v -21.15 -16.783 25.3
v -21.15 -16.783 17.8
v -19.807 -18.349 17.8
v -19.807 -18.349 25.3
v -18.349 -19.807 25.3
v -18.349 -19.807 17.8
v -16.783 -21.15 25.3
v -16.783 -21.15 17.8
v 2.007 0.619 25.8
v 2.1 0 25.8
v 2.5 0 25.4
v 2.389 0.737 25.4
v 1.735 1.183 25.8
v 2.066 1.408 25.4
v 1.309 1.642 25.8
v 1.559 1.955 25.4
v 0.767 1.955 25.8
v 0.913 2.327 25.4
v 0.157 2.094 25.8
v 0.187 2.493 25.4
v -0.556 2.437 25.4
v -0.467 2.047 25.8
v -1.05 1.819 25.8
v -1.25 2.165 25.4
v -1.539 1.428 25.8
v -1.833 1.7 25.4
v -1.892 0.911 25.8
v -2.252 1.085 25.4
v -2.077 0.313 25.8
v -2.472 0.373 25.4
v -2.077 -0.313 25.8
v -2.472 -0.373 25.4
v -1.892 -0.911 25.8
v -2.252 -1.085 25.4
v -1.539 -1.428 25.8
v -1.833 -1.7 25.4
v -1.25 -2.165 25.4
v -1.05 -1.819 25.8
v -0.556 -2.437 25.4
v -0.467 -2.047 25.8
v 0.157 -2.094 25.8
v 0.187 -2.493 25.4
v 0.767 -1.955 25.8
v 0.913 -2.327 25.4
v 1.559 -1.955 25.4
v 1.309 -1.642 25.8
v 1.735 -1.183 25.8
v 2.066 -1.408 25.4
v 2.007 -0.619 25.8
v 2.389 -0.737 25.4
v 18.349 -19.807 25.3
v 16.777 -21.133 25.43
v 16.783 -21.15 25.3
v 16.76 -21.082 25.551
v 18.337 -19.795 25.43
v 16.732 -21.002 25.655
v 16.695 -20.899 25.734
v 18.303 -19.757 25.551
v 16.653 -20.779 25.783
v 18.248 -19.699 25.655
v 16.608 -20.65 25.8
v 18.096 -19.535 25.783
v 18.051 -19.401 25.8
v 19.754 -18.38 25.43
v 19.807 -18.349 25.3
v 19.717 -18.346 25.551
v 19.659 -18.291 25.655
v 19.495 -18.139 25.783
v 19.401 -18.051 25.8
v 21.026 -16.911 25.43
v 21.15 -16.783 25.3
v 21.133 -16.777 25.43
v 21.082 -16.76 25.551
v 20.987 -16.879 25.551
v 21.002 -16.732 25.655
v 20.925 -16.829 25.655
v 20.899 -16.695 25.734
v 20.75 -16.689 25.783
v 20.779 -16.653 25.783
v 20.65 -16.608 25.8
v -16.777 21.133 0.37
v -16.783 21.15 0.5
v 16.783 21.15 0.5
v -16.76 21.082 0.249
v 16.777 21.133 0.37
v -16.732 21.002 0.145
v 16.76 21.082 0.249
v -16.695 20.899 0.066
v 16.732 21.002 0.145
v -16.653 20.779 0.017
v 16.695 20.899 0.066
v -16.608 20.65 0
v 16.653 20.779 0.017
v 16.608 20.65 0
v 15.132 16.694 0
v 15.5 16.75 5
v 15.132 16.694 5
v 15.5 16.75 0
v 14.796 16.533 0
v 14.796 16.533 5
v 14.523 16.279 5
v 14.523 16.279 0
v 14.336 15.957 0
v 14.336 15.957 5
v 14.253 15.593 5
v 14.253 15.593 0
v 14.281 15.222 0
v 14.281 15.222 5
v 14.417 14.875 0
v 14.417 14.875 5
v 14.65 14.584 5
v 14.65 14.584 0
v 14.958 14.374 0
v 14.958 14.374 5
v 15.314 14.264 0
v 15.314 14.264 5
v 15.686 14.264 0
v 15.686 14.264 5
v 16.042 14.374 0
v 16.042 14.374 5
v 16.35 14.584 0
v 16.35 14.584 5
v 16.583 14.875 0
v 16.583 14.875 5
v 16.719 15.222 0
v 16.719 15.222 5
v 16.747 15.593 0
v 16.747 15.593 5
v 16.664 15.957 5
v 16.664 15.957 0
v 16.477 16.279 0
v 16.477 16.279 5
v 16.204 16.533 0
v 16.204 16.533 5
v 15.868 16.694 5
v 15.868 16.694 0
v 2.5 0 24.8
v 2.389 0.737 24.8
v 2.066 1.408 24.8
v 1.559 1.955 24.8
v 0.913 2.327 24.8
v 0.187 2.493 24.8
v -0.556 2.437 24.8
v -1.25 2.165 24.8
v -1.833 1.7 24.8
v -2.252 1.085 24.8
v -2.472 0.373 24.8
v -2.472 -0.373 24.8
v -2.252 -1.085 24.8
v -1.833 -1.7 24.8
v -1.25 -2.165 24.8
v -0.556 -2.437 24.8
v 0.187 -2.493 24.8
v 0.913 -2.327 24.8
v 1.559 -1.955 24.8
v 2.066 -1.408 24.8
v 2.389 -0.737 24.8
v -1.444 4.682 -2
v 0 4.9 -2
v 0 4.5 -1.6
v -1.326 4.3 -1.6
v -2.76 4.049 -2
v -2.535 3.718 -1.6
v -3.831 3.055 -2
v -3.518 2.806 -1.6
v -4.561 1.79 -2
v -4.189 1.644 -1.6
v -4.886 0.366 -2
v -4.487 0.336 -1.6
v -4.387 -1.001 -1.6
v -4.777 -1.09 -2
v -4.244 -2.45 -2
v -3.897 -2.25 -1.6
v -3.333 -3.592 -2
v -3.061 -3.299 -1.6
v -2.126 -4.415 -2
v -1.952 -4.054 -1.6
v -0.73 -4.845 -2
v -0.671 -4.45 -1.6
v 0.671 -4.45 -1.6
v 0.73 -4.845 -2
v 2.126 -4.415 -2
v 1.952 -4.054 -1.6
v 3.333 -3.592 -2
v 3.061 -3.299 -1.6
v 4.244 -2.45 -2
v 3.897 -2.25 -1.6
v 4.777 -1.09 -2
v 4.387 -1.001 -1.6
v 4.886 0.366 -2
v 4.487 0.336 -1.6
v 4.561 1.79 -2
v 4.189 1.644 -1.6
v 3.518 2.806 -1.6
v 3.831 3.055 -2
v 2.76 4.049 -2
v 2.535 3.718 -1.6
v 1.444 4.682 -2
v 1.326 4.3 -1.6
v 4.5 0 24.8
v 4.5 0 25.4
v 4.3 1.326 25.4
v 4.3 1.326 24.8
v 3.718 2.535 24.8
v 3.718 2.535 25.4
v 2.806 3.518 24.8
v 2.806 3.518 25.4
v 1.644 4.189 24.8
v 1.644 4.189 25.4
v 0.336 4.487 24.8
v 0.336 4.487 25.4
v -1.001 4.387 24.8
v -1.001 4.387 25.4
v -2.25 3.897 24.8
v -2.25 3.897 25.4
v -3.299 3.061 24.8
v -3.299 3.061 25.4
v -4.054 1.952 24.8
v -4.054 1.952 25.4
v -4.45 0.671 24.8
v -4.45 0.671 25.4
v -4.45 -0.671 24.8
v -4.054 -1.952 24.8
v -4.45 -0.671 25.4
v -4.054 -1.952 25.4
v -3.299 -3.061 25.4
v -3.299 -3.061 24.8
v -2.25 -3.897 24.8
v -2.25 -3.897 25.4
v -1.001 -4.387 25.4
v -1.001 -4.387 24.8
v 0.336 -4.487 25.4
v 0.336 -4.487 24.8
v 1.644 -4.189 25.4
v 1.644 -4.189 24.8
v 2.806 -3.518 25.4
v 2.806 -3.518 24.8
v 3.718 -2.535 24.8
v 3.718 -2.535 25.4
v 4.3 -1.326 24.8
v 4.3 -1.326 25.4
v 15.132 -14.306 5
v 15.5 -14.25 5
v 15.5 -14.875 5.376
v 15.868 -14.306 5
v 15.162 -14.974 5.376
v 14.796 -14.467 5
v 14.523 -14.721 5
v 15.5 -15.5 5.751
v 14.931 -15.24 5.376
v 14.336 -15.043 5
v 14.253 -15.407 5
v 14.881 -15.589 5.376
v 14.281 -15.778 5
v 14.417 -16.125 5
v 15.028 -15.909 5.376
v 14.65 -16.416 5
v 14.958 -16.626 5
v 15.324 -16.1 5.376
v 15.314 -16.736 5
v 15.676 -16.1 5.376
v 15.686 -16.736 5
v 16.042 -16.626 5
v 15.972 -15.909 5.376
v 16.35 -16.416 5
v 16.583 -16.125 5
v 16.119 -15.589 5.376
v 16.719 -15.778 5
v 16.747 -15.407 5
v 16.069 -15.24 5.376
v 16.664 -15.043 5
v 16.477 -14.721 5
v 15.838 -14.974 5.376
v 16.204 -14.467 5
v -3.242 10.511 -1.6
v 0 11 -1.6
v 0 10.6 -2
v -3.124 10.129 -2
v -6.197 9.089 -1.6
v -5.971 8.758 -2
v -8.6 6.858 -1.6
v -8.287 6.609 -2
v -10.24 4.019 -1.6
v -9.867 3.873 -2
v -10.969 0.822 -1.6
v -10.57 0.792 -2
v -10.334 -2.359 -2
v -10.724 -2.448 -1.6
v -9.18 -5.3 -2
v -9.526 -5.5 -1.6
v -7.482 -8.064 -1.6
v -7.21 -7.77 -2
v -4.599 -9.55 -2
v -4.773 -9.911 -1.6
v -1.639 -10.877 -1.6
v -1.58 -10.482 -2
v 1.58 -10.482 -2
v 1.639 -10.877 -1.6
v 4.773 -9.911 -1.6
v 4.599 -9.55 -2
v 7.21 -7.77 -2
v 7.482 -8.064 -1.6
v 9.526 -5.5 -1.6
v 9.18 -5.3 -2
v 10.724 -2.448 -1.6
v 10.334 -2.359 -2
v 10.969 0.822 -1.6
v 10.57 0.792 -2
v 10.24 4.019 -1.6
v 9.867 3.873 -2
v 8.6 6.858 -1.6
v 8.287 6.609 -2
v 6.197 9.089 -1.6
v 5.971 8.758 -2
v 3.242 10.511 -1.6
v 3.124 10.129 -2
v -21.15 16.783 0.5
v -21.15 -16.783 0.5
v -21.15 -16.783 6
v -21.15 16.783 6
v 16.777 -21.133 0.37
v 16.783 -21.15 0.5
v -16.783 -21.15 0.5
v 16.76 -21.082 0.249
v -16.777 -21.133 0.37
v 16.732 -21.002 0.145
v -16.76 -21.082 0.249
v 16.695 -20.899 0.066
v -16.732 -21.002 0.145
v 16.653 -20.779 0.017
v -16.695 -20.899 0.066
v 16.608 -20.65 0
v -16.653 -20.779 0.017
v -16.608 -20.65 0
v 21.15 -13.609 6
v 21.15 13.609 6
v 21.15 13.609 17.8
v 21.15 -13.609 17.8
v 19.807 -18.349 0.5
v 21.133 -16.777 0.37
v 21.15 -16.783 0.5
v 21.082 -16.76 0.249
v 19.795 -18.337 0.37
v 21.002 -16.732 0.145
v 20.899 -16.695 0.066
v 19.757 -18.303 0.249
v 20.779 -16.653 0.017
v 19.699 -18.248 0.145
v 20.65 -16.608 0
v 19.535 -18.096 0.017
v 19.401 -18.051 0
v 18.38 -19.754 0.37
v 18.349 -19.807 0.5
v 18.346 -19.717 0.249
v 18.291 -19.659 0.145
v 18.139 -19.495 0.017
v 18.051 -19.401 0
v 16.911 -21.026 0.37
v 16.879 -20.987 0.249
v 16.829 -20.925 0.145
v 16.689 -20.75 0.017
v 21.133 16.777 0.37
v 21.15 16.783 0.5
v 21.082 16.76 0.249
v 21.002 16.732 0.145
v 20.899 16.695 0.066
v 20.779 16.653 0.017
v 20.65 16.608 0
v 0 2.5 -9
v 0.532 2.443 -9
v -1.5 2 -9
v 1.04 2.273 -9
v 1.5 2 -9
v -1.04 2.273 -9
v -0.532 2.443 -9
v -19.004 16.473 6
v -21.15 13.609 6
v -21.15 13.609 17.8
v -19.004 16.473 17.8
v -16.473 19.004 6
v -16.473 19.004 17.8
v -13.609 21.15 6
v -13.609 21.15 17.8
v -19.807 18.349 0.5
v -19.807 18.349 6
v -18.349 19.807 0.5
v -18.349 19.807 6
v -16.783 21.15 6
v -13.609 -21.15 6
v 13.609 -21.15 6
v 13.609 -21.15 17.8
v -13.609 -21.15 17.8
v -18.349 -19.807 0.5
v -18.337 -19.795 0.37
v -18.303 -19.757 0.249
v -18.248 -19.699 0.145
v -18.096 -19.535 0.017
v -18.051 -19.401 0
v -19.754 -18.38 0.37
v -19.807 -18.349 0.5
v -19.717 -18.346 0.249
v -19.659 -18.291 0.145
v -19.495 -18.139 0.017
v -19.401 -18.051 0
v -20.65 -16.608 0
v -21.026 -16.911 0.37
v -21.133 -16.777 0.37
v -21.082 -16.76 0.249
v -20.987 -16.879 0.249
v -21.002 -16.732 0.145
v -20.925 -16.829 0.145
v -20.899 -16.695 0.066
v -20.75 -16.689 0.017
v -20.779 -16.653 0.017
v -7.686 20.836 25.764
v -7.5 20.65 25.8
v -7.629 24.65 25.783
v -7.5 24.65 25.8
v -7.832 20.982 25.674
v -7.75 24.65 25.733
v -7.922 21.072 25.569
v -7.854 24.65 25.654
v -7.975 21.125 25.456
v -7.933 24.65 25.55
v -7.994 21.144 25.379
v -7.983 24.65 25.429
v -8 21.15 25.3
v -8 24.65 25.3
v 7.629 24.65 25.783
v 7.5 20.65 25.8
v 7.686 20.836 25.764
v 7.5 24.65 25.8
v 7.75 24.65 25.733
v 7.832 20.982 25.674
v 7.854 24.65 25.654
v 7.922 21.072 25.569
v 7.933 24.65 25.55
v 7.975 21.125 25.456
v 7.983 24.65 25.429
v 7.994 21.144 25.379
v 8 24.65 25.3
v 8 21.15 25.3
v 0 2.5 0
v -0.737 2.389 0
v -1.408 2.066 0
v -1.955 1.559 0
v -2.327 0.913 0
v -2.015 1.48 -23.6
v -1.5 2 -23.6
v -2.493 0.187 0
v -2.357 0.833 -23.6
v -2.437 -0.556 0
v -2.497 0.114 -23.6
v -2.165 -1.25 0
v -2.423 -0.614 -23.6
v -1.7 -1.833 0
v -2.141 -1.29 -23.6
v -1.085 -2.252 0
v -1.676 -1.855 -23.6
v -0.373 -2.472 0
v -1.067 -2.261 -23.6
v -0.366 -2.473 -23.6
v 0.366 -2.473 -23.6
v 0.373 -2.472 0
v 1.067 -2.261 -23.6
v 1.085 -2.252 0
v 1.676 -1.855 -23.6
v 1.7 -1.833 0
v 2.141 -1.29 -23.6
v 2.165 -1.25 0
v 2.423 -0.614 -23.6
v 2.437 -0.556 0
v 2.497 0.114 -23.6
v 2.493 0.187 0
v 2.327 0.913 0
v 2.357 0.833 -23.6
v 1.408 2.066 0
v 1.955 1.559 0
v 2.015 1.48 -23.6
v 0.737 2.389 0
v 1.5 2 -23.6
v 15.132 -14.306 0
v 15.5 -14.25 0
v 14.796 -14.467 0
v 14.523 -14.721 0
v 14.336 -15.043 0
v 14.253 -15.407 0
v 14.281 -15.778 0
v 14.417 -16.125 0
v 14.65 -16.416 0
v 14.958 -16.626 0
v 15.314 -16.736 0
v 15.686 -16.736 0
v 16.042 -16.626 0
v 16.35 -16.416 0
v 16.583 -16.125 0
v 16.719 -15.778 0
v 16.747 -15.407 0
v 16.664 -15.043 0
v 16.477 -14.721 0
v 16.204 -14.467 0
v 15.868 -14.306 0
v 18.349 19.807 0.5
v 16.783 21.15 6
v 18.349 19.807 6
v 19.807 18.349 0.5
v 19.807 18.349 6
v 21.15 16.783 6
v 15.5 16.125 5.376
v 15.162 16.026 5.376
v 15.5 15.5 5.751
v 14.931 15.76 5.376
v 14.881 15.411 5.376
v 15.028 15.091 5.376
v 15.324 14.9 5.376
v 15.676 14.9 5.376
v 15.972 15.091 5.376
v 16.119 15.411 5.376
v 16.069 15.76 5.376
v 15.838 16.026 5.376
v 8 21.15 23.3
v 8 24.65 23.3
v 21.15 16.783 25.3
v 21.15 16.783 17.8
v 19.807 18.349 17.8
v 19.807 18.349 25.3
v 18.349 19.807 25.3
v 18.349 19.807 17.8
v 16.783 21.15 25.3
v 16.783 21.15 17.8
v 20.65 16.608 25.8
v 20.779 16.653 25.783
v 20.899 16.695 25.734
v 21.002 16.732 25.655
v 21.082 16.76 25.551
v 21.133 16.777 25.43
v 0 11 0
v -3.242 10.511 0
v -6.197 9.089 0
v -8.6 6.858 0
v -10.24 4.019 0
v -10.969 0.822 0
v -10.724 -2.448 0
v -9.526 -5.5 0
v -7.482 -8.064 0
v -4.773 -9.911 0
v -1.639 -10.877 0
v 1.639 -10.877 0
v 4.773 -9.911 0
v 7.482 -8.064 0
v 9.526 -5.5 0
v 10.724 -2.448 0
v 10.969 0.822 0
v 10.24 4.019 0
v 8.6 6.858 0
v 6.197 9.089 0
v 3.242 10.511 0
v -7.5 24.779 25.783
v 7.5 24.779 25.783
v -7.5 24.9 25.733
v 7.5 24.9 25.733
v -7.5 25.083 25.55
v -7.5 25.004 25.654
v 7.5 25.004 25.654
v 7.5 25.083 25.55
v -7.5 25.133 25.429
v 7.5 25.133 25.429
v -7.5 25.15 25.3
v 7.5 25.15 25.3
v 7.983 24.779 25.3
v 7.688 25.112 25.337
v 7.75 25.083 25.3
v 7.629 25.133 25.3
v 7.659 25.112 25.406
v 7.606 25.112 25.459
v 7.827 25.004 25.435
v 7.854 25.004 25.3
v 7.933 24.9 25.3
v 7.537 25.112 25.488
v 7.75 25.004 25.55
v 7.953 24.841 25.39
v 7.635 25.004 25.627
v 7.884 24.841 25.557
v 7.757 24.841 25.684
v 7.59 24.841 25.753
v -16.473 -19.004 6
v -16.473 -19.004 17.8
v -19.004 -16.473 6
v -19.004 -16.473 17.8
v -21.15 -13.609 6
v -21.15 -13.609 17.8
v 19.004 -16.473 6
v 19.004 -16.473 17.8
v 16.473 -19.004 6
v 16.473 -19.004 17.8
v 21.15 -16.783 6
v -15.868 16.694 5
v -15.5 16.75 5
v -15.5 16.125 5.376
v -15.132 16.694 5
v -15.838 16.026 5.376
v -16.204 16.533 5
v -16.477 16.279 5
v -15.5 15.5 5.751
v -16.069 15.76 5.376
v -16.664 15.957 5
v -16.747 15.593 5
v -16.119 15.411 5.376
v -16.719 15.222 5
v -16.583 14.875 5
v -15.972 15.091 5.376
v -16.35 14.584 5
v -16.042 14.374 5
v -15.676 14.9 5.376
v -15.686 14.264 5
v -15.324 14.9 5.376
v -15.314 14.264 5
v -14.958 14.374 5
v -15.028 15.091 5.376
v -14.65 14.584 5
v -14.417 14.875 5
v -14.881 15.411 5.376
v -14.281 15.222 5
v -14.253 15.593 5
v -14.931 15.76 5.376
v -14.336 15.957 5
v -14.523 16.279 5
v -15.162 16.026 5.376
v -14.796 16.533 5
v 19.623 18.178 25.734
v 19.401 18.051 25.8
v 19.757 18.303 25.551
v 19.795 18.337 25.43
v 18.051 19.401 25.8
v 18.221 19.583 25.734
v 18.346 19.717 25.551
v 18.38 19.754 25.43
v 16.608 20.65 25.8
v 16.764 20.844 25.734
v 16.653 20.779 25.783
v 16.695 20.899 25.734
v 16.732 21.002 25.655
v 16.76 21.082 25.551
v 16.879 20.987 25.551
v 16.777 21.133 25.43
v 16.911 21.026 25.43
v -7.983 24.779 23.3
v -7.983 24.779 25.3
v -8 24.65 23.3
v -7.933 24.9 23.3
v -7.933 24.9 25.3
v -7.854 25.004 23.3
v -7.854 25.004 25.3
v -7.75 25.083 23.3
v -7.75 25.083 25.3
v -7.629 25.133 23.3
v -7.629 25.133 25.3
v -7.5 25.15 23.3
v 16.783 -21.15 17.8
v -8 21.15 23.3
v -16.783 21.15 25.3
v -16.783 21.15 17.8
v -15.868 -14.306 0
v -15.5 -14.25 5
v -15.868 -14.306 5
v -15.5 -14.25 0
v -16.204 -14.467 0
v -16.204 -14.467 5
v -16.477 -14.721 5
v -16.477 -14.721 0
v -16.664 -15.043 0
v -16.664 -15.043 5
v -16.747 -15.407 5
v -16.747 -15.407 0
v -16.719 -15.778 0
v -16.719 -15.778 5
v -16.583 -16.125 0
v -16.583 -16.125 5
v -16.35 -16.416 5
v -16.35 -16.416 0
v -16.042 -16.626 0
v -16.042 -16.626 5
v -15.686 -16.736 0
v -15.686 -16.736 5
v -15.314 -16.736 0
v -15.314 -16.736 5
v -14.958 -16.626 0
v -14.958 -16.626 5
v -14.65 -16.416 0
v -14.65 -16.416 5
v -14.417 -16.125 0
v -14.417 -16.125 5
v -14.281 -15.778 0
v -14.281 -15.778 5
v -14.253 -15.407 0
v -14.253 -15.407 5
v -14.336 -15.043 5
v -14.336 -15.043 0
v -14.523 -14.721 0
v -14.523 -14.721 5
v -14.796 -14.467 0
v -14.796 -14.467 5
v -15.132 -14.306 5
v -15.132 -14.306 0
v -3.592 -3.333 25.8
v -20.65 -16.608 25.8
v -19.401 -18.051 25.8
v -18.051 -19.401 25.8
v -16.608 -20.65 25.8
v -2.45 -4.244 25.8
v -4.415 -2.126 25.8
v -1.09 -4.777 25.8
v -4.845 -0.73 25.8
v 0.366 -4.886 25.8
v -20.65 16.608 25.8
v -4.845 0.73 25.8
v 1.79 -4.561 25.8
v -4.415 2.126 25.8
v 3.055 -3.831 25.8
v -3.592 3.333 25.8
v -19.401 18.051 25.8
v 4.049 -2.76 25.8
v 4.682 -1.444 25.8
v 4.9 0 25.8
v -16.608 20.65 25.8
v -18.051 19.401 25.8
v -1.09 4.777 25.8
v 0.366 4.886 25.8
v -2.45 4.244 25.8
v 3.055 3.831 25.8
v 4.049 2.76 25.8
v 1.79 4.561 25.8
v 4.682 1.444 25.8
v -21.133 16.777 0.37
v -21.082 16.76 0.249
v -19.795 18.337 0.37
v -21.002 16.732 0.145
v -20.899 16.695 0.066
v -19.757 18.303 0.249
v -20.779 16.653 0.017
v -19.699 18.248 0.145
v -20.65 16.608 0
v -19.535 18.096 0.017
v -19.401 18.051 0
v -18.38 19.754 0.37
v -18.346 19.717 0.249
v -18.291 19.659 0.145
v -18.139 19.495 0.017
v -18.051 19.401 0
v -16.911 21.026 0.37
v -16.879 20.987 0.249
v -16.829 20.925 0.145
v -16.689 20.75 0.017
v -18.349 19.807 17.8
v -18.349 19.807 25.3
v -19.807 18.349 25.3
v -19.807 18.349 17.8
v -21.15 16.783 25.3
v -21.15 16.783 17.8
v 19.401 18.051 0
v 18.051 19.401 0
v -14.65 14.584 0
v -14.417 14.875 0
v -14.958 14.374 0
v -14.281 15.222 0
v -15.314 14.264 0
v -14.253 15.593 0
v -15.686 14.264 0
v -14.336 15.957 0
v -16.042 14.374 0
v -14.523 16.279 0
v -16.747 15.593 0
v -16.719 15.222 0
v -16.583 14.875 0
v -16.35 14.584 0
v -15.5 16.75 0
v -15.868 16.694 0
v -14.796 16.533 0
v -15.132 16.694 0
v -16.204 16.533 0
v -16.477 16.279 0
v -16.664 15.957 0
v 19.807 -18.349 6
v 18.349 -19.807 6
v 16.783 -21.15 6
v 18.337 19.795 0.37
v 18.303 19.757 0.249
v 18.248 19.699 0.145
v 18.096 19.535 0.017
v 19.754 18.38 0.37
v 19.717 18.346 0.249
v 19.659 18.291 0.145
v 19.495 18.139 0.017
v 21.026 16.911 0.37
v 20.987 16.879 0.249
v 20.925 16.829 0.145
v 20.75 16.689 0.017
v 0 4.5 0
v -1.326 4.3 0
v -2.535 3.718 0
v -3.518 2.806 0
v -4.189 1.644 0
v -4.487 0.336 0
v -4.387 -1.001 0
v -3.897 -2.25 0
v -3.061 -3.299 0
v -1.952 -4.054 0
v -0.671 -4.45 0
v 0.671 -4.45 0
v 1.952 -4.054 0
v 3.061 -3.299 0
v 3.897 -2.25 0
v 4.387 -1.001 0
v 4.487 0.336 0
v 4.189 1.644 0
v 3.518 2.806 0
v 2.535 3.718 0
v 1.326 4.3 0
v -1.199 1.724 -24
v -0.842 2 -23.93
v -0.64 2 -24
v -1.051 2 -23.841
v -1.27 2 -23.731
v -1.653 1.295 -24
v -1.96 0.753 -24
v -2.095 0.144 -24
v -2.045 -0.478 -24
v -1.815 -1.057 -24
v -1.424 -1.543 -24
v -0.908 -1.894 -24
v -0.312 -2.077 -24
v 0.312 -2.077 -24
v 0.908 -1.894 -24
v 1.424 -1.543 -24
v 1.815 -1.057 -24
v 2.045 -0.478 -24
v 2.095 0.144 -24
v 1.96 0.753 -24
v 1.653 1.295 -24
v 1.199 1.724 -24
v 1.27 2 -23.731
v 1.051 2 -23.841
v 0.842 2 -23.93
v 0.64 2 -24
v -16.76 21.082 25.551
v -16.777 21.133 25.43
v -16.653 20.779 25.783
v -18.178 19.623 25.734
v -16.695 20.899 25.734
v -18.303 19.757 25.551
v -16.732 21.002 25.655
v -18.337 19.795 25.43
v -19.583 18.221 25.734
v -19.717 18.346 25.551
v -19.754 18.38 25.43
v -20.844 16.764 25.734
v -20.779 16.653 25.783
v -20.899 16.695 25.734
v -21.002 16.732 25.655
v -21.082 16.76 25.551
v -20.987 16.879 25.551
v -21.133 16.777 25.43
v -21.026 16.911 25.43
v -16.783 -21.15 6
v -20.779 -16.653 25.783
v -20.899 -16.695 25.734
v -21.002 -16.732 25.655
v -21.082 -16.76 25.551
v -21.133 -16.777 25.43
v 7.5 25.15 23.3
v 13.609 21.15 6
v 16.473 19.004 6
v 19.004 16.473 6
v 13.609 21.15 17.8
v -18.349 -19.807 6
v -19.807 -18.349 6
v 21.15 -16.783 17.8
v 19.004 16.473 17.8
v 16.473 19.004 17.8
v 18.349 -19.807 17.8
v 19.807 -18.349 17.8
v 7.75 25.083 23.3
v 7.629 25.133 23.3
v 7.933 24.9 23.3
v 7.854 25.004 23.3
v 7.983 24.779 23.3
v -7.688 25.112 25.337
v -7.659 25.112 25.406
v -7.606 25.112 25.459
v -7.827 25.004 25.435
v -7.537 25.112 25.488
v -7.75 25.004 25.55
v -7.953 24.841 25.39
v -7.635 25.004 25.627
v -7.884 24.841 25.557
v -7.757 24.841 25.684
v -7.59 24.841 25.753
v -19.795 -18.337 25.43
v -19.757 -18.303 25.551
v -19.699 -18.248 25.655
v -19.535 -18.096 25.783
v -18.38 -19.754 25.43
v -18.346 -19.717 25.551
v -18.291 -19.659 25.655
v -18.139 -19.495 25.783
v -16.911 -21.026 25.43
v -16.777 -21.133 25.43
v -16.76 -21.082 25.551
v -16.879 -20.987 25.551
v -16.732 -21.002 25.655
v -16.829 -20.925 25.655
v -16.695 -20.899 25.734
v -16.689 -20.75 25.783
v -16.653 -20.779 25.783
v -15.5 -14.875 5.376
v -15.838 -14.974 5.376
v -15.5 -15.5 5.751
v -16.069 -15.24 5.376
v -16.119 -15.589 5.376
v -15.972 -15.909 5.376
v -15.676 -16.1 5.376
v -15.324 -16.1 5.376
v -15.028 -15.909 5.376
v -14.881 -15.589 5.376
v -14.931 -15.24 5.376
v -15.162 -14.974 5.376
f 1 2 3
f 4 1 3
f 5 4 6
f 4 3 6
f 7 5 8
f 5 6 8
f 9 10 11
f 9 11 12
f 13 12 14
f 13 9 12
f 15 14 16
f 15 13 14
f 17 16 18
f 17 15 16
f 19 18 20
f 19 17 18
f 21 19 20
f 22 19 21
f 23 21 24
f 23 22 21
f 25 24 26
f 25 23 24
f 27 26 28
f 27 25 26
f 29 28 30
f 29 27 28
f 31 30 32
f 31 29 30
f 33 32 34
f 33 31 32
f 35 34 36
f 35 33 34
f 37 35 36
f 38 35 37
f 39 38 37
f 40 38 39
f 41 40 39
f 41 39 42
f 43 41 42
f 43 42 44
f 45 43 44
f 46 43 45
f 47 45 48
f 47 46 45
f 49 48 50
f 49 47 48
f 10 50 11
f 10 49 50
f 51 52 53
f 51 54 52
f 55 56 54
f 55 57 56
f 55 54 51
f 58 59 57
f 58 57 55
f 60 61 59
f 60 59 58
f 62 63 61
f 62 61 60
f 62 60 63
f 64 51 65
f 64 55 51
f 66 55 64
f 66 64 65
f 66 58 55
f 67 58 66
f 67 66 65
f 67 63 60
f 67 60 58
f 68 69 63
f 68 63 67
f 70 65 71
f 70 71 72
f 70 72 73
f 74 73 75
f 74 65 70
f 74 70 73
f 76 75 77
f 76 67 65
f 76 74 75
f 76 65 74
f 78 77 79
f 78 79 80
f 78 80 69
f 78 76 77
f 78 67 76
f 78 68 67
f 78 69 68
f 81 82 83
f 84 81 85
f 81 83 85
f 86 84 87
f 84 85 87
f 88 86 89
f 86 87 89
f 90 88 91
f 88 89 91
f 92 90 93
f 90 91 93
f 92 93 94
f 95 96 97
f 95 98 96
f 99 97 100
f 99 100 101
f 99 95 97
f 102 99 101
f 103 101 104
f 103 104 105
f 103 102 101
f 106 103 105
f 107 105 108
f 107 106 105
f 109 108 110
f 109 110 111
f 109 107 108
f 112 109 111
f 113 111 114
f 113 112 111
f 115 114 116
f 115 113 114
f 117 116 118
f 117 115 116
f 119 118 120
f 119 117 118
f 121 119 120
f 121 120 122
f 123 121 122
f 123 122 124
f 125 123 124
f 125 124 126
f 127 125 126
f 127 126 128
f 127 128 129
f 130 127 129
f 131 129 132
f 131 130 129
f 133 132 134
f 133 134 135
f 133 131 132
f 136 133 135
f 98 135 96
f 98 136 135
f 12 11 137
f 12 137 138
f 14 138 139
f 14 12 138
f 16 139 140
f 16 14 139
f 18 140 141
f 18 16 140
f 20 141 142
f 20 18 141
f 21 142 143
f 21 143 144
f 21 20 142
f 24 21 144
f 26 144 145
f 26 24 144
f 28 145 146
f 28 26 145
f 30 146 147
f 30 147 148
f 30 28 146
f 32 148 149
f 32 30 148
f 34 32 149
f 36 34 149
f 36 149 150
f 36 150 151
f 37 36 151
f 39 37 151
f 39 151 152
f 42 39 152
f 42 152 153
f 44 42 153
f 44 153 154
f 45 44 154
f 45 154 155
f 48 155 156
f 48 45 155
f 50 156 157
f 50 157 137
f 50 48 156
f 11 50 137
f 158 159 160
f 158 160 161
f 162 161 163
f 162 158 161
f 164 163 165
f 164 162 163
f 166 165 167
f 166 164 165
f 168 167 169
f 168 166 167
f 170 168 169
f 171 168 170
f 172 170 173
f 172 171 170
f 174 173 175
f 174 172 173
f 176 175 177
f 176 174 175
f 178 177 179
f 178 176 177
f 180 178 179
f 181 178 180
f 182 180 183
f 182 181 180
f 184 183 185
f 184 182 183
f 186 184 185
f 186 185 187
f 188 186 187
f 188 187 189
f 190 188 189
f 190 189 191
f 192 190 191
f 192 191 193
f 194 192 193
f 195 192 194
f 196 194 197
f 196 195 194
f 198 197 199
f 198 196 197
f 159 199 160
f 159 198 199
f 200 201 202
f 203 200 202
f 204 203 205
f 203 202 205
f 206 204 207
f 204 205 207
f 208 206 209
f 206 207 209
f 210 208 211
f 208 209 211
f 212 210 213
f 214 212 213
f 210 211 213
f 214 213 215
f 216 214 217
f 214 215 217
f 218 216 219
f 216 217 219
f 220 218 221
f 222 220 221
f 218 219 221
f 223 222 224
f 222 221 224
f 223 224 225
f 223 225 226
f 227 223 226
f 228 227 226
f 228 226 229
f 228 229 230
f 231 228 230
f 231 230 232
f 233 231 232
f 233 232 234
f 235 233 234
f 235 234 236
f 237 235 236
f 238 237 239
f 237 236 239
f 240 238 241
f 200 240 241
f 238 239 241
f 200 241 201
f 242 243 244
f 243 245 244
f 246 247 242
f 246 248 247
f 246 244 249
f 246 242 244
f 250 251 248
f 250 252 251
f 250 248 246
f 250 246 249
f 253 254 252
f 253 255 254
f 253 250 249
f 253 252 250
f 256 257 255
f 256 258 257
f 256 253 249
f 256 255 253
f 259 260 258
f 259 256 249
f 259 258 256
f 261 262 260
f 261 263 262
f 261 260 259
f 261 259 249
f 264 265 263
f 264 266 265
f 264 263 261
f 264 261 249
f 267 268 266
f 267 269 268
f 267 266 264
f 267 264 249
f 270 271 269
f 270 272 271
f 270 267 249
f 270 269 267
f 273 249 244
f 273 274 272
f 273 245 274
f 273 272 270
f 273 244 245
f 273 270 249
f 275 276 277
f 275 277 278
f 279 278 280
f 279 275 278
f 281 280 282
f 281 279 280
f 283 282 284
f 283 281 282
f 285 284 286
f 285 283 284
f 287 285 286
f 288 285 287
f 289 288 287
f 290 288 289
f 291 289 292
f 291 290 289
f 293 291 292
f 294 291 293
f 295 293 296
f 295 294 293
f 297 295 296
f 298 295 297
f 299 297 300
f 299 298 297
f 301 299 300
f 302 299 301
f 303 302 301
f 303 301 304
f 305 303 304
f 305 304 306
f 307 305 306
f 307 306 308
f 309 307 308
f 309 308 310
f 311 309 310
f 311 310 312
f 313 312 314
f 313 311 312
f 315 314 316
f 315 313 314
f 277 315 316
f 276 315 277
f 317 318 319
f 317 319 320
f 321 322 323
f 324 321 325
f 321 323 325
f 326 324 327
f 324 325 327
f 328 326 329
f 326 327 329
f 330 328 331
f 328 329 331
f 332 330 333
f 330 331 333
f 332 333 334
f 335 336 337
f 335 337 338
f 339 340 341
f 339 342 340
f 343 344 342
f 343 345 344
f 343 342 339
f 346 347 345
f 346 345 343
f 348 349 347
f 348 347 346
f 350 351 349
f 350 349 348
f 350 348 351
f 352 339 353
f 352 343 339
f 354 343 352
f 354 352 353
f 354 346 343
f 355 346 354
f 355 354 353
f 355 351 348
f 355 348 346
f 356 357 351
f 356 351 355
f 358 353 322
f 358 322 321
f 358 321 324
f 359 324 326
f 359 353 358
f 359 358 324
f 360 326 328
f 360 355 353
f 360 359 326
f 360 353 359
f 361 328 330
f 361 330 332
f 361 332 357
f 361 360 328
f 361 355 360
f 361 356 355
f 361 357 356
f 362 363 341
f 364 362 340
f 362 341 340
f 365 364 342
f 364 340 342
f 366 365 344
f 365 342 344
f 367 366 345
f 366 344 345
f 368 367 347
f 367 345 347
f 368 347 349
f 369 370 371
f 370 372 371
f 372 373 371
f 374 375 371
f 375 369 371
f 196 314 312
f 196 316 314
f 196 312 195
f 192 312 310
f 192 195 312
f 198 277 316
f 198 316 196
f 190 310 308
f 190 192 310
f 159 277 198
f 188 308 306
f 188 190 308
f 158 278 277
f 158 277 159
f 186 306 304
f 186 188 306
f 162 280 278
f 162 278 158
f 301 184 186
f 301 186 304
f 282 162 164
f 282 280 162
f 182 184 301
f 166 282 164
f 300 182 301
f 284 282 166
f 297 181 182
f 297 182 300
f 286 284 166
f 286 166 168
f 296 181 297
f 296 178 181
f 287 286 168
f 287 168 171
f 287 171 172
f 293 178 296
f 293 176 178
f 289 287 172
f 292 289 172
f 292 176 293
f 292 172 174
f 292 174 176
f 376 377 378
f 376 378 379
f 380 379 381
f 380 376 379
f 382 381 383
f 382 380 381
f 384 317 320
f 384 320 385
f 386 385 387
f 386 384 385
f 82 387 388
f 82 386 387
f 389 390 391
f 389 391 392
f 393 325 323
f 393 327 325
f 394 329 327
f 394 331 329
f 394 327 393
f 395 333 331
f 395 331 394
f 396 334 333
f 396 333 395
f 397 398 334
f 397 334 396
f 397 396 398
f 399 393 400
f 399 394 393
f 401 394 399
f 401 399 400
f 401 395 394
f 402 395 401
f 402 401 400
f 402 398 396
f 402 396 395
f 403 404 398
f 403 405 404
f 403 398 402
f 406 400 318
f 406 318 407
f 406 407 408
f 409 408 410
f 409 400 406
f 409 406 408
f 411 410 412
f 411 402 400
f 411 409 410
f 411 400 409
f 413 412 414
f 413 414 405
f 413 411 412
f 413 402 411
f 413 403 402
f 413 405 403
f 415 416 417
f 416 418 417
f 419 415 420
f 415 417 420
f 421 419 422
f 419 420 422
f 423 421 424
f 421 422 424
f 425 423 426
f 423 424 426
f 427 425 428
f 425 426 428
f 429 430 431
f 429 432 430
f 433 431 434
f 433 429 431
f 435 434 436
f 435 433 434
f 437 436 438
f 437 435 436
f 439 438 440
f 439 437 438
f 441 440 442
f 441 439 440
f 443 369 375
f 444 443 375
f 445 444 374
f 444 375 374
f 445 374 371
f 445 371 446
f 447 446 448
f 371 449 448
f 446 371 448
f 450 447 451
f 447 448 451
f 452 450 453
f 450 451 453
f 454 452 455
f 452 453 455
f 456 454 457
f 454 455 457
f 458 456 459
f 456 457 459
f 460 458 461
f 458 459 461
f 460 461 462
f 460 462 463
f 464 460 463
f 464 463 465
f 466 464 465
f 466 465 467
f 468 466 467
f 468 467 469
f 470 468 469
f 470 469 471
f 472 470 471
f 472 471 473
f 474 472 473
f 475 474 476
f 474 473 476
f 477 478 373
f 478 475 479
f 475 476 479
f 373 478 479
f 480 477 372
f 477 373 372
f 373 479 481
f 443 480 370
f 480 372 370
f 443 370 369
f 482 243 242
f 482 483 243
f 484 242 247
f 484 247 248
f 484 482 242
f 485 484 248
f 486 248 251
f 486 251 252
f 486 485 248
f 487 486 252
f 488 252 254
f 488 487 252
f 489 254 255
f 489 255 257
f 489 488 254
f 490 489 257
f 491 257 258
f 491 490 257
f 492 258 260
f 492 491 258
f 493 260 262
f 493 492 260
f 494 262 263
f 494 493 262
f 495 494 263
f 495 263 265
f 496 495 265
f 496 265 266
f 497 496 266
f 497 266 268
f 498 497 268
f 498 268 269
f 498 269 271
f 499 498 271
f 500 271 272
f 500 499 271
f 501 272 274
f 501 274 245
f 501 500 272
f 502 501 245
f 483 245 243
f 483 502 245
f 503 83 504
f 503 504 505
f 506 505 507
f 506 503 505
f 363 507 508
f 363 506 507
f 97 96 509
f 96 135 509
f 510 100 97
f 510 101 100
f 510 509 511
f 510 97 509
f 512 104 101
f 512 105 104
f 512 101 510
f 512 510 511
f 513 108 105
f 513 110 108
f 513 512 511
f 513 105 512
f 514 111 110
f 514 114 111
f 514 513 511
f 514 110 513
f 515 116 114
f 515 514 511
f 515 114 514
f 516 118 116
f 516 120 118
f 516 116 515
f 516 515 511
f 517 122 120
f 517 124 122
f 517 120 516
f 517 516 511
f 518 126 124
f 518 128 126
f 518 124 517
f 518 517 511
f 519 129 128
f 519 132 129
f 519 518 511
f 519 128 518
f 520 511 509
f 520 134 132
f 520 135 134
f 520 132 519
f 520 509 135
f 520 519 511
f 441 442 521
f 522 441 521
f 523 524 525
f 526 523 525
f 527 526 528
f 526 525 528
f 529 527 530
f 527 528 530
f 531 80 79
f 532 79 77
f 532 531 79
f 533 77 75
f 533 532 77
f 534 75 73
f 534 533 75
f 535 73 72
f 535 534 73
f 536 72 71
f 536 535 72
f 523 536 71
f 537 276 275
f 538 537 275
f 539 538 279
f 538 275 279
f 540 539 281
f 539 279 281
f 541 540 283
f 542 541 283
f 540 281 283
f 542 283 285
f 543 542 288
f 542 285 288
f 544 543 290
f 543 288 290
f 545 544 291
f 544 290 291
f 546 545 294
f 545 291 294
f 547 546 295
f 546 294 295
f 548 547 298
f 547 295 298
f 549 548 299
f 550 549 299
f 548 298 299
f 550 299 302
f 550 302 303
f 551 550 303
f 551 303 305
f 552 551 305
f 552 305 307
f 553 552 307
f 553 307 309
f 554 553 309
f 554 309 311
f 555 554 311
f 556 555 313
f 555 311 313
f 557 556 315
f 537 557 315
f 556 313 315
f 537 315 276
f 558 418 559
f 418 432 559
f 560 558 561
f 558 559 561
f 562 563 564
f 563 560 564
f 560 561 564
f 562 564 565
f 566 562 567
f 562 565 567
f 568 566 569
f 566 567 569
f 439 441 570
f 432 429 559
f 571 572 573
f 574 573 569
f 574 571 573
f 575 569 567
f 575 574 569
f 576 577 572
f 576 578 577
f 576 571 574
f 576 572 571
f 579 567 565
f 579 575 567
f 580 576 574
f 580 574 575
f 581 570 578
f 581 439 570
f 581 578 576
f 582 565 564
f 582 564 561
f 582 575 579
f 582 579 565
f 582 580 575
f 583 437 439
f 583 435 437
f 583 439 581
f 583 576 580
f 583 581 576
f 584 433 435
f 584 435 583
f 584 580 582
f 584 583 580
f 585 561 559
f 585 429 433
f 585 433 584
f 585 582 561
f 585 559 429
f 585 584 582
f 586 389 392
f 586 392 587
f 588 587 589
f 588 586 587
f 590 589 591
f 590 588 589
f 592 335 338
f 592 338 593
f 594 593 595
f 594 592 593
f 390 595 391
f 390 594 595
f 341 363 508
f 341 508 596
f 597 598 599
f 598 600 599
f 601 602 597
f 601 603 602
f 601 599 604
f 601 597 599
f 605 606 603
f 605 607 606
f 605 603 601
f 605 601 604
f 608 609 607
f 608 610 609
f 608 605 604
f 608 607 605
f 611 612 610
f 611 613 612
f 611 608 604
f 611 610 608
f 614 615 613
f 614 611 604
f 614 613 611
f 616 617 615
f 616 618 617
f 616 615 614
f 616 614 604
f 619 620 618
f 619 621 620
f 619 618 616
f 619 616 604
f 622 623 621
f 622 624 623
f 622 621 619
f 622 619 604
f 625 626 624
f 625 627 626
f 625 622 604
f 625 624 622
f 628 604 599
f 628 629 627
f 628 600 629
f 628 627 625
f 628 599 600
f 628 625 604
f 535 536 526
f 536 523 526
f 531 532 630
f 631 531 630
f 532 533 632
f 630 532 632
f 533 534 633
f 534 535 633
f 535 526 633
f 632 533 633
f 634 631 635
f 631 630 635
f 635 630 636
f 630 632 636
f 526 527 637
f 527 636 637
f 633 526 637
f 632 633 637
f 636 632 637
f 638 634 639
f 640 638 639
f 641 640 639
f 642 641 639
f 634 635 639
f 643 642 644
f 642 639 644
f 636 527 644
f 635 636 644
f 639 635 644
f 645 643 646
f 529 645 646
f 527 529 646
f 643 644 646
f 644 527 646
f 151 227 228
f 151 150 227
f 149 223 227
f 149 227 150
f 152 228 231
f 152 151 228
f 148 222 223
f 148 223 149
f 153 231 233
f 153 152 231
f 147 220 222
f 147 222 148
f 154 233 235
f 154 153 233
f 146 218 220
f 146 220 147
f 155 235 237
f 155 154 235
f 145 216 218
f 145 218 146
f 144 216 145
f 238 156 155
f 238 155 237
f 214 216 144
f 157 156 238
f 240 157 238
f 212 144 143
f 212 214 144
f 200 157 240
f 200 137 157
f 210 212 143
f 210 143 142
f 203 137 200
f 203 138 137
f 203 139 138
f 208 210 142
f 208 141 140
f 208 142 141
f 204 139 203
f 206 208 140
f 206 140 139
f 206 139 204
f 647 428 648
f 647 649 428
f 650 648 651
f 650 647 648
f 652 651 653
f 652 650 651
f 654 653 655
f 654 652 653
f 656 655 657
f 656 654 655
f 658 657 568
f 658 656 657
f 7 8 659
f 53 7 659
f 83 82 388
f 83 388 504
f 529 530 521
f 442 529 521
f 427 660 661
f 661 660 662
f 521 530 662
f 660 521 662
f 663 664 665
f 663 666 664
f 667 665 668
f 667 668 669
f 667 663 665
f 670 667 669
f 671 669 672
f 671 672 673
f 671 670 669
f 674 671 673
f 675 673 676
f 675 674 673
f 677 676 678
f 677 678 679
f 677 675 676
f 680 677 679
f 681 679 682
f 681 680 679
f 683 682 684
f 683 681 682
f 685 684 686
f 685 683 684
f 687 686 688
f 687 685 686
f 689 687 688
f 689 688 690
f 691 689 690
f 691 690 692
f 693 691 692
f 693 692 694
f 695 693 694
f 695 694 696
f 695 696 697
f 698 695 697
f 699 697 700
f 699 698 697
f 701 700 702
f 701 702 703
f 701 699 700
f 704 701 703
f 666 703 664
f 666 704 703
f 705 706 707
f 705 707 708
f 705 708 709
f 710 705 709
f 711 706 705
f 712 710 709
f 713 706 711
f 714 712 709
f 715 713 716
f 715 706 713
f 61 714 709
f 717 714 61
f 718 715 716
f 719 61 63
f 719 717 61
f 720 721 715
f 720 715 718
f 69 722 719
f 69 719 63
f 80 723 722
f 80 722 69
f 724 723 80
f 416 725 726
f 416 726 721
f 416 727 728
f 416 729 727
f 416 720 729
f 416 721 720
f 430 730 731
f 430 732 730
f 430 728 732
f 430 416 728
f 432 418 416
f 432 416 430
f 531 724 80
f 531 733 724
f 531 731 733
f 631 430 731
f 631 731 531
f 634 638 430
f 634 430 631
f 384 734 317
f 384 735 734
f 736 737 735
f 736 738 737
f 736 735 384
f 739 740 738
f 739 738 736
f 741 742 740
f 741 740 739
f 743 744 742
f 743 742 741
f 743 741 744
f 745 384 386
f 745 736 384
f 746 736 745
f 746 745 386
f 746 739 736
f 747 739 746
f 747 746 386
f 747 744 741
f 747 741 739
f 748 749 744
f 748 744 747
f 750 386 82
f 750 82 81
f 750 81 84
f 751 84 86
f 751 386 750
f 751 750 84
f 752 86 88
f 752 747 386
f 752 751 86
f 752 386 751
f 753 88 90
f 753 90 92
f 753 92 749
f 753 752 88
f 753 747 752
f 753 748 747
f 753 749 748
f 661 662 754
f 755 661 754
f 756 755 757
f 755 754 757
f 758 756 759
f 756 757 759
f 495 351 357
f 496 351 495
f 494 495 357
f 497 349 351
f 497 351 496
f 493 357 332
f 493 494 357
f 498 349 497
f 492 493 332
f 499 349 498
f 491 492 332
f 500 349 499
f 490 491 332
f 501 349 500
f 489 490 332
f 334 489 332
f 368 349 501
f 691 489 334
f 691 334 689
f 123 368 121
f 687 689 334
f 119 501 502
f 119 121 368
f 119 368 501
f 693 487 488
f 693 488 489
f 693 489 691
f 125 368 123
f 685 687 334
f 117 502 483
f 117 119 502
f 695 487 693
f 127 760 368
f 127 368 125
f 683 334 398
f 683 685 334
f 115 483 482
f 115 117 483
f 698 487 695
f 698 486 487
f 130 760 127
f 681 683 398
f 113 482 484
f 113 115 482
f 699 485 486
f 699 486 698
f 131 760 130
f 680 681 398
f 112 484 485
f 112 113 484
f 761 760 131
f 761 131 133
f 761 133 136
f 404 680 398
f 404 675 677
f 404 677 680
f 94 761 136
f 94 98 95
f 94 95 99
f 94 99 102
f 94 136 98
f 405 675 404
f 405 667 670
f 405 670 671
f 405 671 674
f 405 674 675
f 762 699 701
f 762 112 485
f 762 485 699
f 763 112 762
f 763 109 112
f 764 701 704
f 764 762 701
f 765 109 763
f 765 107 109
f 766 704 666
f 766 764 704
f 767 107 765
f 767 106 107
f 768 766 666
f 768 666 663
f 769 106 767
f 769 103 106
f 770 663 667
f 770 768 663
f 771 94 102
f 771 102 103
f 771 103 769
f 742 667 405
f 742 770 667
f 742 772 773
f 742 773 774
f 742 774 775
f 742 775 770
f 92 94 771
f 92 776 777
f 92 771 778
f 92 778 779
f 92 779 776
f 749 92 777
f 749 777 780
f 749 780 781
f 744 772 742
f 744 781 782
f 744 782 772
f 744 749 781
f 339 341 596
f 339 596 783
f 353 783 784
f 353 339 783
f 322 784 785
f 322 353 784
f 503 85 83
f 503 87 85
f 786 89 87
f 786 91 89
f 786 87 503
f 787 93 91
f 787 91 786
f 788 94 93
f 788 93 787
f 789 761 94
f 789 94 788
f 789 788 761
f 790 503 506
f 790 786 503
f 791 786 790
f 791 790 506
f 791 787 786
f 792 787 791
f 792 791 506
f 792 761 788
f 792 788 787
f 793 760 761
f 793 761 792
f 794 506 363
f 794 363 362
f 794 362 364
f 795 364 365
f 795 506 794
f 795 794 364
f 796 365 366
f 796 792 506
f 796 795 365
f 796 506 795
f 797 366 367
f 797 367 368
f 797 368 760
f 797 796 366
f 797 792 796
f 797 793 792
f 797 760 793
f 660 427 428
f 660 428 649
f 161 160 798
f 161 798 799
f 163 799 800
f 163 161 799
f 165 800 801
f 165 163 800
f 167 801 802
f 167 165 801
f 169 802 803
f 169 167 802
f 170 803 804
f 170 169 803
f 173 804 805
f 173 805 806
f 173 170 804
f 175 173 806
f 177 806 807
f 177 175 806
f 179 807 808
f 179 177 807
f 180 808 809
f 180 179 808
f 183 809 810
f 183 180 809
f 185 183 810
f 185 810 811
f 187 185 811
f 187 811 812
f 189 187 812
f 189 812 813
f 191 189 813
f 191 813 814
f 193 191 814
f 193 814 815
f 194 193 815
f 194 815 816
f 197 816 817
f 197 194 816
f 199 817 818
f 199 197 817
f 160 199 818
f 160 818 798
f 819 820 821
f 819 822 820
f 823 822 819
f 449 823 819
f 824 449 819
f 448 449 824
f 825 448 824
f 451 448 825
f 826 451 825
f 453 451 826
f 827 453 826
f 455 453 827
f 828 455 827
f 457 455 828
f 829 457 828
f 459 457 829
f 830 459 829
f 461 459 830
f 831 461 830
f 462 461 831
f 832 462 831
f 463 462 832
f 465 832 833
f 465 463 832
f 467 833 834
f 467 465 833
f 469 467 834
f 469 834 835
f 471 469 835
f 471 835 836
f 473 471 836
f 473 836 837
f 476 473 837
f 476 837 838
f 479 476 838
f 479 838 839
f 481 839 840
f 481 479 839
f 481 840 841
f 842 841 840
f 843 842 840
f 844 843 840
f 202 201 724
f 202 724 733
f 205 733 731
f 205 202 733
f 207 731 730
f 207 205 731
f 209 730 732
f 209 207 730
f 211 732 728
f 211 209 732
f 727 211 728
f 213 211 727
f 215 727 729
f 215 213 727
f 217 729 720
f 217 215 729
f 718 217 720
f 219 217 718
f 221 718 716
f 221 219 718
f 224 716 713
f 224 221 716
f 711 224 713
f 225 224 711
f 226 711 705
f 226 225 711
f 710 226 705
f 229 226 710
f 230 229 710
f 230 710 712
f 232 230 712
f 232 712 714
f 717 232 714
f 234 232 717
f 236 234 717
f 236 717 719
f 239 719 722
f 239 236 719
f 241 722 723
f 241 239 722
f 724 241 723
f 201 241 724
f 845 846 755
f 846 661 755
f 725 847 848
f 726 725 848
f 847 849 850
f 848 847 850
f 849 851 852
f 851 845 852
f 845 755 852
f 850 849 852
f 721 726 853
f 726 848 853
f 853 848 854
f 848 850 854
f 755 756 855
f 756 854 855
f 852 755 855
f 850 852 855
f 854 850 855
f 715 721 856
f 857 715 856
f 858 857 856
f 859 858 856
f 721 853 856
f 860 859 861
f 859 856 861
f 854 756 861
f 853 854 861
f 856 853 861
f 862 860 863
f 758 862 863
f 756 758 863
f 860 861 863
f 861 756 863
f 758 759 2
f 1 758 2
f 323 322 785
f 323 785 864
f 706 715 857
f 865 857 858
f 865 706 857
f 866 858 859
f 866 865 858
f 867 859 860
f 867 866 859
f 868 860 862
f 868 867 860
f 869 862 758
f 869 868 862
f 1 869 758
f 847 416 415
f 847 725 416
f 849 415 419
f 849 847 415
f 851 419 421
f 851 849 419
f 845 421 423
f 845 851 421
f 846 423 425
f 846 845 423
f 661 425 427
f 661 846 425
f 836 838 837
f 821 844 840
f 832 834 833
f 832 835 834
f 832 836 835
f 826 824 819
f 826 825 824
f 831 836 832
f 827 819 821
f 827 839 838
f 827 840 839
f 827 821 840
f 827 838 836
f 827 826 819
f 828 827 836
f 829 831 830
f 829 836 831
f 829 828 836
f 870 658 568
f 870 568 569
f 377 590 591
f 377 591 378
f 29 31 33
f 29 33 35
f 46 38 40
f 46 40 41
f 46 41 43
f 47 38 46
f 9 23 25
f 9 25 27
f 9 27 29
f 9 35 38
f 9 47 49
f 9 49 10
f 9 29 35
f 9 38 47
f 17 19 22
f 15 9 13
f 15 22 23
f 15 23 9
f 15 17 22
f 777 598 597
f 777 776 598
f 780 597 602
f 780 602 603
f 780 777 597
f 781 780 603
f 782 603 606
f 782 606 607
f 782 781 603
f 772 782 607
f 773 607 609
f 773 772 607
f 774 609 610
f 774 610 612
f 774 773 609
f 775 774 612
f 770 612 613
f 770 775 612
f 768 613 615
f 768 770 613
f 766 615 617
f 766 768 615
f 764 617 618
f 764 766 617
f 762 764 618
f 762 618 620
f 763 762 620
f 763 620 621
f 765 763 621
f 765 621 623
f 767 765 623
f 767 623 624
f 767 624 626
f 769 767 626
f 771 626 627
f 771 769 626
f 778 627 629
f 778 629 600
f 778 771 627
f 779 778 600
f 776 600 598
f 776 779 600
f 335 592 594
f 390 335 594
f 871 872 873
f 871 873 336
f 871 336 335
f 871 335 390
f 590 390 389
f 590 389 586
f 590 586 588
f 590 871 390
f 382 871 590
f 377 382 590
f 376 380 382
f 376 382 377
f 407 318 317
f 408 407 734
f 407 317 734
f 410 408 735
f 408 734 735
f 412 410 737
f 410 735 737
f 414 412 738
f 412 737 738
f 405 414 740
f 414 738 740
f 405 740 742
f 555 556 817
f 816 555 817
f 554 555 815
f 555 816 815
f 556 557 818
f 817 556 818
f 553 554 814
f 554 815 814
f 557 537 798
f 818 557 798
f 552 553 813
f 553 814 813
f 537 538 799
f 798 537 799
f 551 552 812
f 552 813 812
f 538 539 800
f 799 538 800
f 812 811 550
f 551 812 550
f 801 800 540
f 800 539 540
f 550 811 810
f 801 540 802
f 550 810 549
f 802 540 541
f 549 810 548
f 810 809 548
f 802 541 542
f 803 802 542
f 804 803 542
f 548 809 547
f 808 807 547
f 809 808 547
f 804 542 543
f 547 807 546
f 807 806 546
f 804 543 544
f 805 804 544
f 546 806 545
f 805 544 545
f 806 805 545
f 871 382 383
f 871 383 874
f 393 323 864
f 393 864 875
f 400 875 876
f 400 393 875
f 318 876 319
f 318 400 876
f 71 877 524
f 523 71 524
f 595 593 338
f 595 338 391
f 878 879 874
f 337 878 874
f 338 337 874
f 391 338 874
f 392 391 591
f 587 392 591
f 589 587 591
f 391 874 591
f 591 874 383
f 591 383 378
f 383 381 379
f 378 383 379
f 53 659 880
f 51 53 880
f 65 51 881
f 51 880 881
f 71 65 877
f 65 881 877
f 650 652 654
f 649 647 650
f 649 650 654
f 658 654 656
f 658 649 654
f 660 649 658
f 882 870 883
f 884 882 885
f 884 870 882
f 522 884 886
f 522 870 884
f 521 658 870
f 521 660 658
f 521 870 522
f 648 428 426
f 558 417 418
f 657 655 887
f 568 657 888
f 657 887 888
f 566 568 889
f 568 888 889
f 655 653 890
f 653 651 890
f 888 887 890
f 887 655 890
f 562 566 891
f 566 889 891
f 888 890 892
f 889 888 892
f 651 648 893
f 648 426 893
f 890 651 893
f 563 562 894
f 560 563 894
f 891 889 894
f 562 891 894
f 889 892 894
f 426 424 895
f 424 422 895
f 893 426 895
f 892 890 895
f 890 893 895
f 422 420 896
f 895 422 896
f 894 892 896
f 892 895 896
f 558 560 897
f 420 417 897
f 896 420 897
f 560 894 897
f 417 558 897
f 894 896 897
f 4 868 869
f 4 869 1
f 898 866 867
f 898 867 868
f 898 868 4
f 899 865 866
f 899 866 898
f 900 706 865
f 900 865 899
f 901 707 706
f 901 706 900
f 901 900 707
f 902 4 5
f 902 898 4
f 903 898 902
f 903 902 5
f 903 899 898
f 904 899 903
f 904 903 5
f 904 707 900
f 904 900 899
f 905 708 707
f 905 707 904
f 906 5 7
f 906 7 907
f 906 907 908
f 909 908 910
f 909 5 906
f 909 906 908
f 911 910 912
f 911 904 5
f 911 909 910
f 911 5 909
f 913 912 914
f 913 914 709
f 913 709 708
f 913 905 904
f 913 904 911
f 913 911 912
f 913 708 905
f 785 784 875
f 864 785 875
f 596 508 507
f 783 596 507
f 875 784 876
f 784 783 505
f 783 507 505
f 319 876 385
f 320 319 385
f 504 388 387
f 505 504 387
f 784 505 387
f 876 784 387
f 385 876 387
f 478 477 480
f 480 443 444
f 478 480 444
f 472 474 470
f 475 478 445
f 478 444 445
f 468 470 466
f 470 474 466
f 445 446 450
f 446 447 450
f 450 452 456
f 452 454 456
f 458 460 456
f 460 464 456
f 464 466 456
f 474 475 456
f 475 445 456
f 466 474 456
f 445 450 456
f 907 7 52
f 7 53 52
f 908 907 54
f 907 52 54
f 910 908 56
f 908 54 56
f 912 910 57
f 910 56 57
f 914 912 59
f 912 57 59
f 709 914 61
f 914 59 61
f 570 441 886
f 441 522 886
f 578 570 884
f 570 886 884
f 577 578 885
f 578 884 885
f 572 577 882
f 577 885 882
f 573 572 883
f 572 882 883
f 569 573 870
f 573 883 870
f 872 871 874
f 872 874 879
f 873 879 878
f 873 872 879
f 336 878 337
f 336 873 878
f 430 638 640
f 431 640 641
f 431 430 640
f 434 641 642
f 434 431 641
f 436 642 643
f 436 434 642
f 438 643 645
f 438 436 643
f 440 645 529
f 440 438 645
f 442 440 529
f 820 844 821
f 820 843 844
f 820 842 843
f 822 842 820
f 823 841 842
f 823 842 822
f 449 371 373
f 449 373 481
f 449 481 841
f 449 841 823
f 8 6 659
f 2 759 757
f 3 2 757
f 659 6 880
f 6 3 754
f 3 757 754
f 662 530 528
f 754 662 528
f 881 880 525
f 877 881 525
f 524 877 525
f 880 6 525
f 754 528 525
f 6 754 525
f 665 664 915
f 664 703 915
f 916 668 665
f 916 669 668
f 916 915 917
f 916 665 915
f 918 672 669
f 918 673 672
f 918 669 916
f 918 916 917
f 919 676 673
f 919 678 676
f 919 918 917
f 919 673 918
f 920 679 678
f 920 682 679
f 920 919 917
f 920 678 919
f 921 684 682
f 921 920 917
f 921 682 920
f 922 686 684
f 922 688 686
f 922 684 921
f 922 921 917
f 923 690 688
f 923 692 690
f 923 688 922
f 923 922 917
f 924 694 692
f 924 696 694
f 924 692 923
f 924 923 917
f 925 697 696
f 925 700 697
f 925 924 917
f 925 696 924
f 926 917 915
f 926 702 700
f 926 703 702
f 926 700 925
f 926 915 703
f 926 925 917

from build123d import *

# Parameters (mm, degrees)
BOSS_EXTRU_1_DEPTH           = 6
BOSS_EXTRU_2_DEPTH           = 11.8
BOSS_EXTRU_3_DEPTH           = 8
ESQUISSE4_W                  = 16
ESQUISSE4_H                  = 2.5
BOSS_EXTRU_4_DEPTH           = 4
ESQUISSE5_W                  = 2
ESQUISSE5_H                  = 6.5
ESQUISSE5_W_2                = 24
ESQUISSE5_H_2                = 2.5
CONG_1_R                     = 0.5
CONG_2_R                     = 0.5
CHANFREIN1_SIZE              = 0.4
CHANFREIN2_SIZE              = 0.4
ESQUISSE6_W                  = 15
ESQUISSE6_H                  = 0.5
ENL_V_MAT_EXTRU_1_DEPTH      = 22.1500001
ENL_V_MAT_EXTRU_1_DEPTH_BACK = 22.1500001
ESQUISSE7_R                  = 4.5
ESQUISSE7_R_2                = 2.5
ENL_V_MAT_EXTRU_2_DEPTH      = 1
CHANFREIN3_SIZE              = 0.4
TROU_TARAUD_M31_AT_2_COUNT   = 2
TROU_TARAUD_M31_AT_2_PITCH   = 31
TROU_TARAUD_M31_AT_3_COUNT   = 2
TROU_TARAUD_M31_AT_3_PITCH   = 43.840620434
TROU_TARAUD_M31_AT_4_COUNT   = 2
TROU_TARAUD_M31_AT_4_PITCH   = 31


with BuildPart() as part:
    # Esquisse1 → Boss.-Extru.1 (new body)
    with BuildSketch(Plane.XY):
        with BuildLine():
            Line((21.15, 16.783250579), (21.15, -16.783250579))
            ThreePointArc((21.15, -16.783250579), (19.091883092, -19.091883092), (16.783250579, -21.15))
            Line((16.783250579, -21.15), (-16.783250579, -21.15))
            ThreePointArc((-16.783250579, -21.15), (-19.091883092, -19.091883092), (-21.15, -16.783250579))
            Line((-21.15, -16.783250579), (-21.15, 16.783250579))
            ThreePointArc((-21.15, 16.783250579), (-19.091883092, 19.091883092), (-16.783250579, 21.15))
            Line((-16.783250579, 21.15), (16.783250579, 21.15))
            ThreePointArc((16.783250579, 21.15), (19.091883092, 19.091883092), (21.15, 16.783250579))
        make_face()
    extrude(amount=BOSS_EXTRU_1_DEPTH)

    # Congé2
    cong_2_edges = [part.edges().sort_by_distance(p)[0] for p in [
        (0, 21.15, 0),
        (19.091883092, 19.091883092, 0),
        (21.15, 0, 0),
        (19.091883092, -19.091883092, 0),
        (0, -21.15, 0),
        (-19.091883092, -19.091883092, 0),
        (-21.15, 0, 0),
        (-19.091883092, 19.091883092, 0),
    ]]
    fillet(cong_2_edges, radius=CONG_2_R)

    # Esquisse9 → Trou taraudé M31 (revolve, cut)
    with BuildSketch(Plane(origin=(15.5, -15.5, 0), x_dir=(0, 1, 0), z_dir=(1, 0, 0))):
        Polygon((0, 0), (0, 5.751075774), (1.25, 5), (1.25, 0), align=None)
    trou_taraud_m31 = revolve(axis=Axis((15.5, -15.5, -6.35), (0, 0, 1)), mode=Mode.SUBTRACT)

    # Trou taraudé M31 at 2: Trou taraudé M31 ×2
    with Locations(*[(0, i * TROU_TARAUD_M31_AT_2_PITCH, 0) for i in range(1, TROU_TARAUD_M31_AT_2_COUNT)]):
        add(trou_taraud_m31, mode=Mode.SUBTRACT)

    # Trou taraudé M31 at 3: Trou taraudé M31 ×2
    with Locations(*[Vector(-0.707106781, 0.707106781, 0) * (i * TROU_TARAUD_M31_AT_3_PITCH) for i in range(1, TROU_TARAUD_M31_AT_3_COUNT)]):
        add(trou_taraud_m31, mode=Mode.SUBTRACT)

    # Trou taraudé M31 at 4: Trou taraudé M31 ×2
    with Locations(*[(-i * TROU_TARAUD_M31_AT_4_PITCH, 0, 0) for i in range(1, TROU_TARAUD_M31_AT_4_COUNT)]):
        add(trou_taraud_m31, mode=Mode.SUBTRACT)


with BuildPart() as body_2:
    # Esquisse2 → Boss.-Extru.2 (new body)
    with BuildSketch(Plane.XY.offset(6)):
        with BuildLine():
            Line((-13.608820669, 21.15), (13.608820669, 21.15))
            ThreePointArc((13.608820669, 21.15), (17.783735547, 17.783735547), (21.15, 13.608820669))
            Line((21.15, 13.608820669), (21.15, -13.608820669))
            ThreePointArc((21.15, -13.608820669), (17.783735547, -17.783735547), (13.608820669, -21.15))
            Line((13.608820669, -21.15), (-13.608820669, -21.15))
            ThreePointArc((-13.608820669, -21.15), (-17.783735547, -17.783735547), (-21.15, -13.608820669))
            Line((-21.15, -13.608820669), (-21.15, 13.608820669))
            ThreePointArc((-21.15, 13.608820669), (-17.783735547, 17.783735547), (-13.608820669, 21.15))
        make_face()
    extrude(amount=BOSS_EXTRU_2_DEPTH)


with BuildPart() as body_3:
    # Esquisse3 → Boss.-Extru.3 (new body)
    with BuildSketch(Plane.XY.offset(17.8)):
        with BuildLine():
            Line((-16.783250579, -21.15), (16.783250579, -21.15))
            ThreePointArc((16.783250579, -21.15), (19.091883092, -19.091883092), (21.15, -16.783250579))
            Line((21.15, -16.783250579), (21.15, 16.783250579))
            ThreePointArc((21.15, 16.783250579), (19.091883092, 19.091883092), (16.783250579, 21.15))
            Line((16.783250579, 21.15), (-16.783250579, 21.15))
            ThreePointArc((-16.783250579, 21.15), (-19.091883092, 19.091883092), (-21.15, 16.783250579))
            Line((-21.15, 16.783250579), (-21.15, -16.783250579))
            ThreePointArc((-21.15, -16.783250579), (-19.091883092, -19.091883092), (-16.783250579, -21.15))
        make_face()
    extrude(amount=BOSS_EXTRU_3_DEPTH)

    # Esquisse4 → Boss.-Extru.4 (add)
    with BuildSketch(Plane(origin=(0, 21.15, 0), x_dir=(1, 0, 0), z_dir=(0, 1, 0))):
        with Locations((0, -24.55)):
            Rectangle(ESQUISSE4_W, ESQUISSE4_H)
    extrude(amount=BOSS_EXTRU_4_DEPTH)

    # Congé1
    cong_1_edges = [body_3.edges().sort_by_distance(p)[0] for p in [
        (19.091883092, -19.091883092, 25.8),
        (21.15, 0, 25.8),
        (19.091883092, 19.091883092, 25.8),
        (12.39162529, 21.15, 25.8),
        (-19.091883092, 19.091883092, 25.8),
        (-21.15, 0, 25.8),
        (-12.39162529, 21.15, 25.8),
        (8, 23.15, 25.8),
        (-8, 23.15, 25.8),
        (8, 25.15, 24.55),
        (-8, 25.15, 24.55),
        (0, 25.15, 25.8),
        (-19.091883092, -19.091883092, 25.8),
        (0, -21.15, 25.8),
    ]]
    fillet(cong_1_edges, radius=CONG_1_R)

    # Esquisse7 → Enlèv. mat.-Extru.2 (cut)
    with BuildSketch(Plane.XY.offset(25.8)):
        Circle(ESQUISSE7_R)
        Circle(ESQUISSE7_R_2, mode=Mode.SUBTRACT)
    extrude(amount=-ENL_V_MAT_EXTRU_2_DEPTH, mode=Mode.SUBTRACT)

    # Chanfrein3
    chanfrein3_edges = [body_3.edges().sort_by_distance(p)[0] for p in [
        (-4.5, 0, 25.8),
        (-2.5, 0, 25.8),
    ]]
    chamfer(chanfrein3_edges, length=CHANFREIN3_SIZE)


with BuildPart() as body_4:
    # Esquisse5 → Révolution1 (revolve)
    with BuildSketch(Plane(origin=(0, 0, 0), x_dir=(0, 0, -1), z_dir=(1, 0, 0))):
        with Locations((1, 7.75)):
            Rectangle(ESQUISSE5_W, ESQUISSE5_H)
        with Locations((12, 1.25)):
            Rectangle(ESQUISSE5_W_2, ESQUISSE5_H_2)
    revolve(axis=Axis((0, 0, 0), (0, 0, 1)))

    # Chanfrein1
    chanfrein1_edges = [body_4.edges().sort_by_distance(p)[0] for p in [
        (0, -2.5, -24),
    ]]
    chamfer(chanfrein1_edges, length=CHANFREIN1_SIZE)

    # Chanfrein2
    chanfrein2_edges = [body_4.edges().sort_by_distance(p)[0] for p in [
        (0, -11, -2),
        (0, -4.5, -2),
    ]]
    chamfer(chanfrein2_edges, length=CHANFREIN2_SIZE)

    # Esquisse6 → Enlèv. mat.-Extru.1 (cut, two sides)
    with BuildSketch(Plane(origin=(0, 0, 0), x_dir=(0, 0, -1), z_dir=(1, 0, 0))) as enl_v_mat_extru_1_sk:
        with Locations((16.5, 2.25)):
            Rectangle(ESQUISSE6_W, ESQUISSE6_H)
    extrude(amount=ENL_V_MAT_EXTRU_1_DEPTH, mode=Mode.SUBTRACT)
    extrude(enl_v_mat_extru_1_sk.sketch, amount=-ENL_V_MAT_EXTRU_1_DEPTH_BACK, mode=Mode.SUBTRACT)


solid = Compound([part.part, body_2.part, body_3.part, body_4.part])
